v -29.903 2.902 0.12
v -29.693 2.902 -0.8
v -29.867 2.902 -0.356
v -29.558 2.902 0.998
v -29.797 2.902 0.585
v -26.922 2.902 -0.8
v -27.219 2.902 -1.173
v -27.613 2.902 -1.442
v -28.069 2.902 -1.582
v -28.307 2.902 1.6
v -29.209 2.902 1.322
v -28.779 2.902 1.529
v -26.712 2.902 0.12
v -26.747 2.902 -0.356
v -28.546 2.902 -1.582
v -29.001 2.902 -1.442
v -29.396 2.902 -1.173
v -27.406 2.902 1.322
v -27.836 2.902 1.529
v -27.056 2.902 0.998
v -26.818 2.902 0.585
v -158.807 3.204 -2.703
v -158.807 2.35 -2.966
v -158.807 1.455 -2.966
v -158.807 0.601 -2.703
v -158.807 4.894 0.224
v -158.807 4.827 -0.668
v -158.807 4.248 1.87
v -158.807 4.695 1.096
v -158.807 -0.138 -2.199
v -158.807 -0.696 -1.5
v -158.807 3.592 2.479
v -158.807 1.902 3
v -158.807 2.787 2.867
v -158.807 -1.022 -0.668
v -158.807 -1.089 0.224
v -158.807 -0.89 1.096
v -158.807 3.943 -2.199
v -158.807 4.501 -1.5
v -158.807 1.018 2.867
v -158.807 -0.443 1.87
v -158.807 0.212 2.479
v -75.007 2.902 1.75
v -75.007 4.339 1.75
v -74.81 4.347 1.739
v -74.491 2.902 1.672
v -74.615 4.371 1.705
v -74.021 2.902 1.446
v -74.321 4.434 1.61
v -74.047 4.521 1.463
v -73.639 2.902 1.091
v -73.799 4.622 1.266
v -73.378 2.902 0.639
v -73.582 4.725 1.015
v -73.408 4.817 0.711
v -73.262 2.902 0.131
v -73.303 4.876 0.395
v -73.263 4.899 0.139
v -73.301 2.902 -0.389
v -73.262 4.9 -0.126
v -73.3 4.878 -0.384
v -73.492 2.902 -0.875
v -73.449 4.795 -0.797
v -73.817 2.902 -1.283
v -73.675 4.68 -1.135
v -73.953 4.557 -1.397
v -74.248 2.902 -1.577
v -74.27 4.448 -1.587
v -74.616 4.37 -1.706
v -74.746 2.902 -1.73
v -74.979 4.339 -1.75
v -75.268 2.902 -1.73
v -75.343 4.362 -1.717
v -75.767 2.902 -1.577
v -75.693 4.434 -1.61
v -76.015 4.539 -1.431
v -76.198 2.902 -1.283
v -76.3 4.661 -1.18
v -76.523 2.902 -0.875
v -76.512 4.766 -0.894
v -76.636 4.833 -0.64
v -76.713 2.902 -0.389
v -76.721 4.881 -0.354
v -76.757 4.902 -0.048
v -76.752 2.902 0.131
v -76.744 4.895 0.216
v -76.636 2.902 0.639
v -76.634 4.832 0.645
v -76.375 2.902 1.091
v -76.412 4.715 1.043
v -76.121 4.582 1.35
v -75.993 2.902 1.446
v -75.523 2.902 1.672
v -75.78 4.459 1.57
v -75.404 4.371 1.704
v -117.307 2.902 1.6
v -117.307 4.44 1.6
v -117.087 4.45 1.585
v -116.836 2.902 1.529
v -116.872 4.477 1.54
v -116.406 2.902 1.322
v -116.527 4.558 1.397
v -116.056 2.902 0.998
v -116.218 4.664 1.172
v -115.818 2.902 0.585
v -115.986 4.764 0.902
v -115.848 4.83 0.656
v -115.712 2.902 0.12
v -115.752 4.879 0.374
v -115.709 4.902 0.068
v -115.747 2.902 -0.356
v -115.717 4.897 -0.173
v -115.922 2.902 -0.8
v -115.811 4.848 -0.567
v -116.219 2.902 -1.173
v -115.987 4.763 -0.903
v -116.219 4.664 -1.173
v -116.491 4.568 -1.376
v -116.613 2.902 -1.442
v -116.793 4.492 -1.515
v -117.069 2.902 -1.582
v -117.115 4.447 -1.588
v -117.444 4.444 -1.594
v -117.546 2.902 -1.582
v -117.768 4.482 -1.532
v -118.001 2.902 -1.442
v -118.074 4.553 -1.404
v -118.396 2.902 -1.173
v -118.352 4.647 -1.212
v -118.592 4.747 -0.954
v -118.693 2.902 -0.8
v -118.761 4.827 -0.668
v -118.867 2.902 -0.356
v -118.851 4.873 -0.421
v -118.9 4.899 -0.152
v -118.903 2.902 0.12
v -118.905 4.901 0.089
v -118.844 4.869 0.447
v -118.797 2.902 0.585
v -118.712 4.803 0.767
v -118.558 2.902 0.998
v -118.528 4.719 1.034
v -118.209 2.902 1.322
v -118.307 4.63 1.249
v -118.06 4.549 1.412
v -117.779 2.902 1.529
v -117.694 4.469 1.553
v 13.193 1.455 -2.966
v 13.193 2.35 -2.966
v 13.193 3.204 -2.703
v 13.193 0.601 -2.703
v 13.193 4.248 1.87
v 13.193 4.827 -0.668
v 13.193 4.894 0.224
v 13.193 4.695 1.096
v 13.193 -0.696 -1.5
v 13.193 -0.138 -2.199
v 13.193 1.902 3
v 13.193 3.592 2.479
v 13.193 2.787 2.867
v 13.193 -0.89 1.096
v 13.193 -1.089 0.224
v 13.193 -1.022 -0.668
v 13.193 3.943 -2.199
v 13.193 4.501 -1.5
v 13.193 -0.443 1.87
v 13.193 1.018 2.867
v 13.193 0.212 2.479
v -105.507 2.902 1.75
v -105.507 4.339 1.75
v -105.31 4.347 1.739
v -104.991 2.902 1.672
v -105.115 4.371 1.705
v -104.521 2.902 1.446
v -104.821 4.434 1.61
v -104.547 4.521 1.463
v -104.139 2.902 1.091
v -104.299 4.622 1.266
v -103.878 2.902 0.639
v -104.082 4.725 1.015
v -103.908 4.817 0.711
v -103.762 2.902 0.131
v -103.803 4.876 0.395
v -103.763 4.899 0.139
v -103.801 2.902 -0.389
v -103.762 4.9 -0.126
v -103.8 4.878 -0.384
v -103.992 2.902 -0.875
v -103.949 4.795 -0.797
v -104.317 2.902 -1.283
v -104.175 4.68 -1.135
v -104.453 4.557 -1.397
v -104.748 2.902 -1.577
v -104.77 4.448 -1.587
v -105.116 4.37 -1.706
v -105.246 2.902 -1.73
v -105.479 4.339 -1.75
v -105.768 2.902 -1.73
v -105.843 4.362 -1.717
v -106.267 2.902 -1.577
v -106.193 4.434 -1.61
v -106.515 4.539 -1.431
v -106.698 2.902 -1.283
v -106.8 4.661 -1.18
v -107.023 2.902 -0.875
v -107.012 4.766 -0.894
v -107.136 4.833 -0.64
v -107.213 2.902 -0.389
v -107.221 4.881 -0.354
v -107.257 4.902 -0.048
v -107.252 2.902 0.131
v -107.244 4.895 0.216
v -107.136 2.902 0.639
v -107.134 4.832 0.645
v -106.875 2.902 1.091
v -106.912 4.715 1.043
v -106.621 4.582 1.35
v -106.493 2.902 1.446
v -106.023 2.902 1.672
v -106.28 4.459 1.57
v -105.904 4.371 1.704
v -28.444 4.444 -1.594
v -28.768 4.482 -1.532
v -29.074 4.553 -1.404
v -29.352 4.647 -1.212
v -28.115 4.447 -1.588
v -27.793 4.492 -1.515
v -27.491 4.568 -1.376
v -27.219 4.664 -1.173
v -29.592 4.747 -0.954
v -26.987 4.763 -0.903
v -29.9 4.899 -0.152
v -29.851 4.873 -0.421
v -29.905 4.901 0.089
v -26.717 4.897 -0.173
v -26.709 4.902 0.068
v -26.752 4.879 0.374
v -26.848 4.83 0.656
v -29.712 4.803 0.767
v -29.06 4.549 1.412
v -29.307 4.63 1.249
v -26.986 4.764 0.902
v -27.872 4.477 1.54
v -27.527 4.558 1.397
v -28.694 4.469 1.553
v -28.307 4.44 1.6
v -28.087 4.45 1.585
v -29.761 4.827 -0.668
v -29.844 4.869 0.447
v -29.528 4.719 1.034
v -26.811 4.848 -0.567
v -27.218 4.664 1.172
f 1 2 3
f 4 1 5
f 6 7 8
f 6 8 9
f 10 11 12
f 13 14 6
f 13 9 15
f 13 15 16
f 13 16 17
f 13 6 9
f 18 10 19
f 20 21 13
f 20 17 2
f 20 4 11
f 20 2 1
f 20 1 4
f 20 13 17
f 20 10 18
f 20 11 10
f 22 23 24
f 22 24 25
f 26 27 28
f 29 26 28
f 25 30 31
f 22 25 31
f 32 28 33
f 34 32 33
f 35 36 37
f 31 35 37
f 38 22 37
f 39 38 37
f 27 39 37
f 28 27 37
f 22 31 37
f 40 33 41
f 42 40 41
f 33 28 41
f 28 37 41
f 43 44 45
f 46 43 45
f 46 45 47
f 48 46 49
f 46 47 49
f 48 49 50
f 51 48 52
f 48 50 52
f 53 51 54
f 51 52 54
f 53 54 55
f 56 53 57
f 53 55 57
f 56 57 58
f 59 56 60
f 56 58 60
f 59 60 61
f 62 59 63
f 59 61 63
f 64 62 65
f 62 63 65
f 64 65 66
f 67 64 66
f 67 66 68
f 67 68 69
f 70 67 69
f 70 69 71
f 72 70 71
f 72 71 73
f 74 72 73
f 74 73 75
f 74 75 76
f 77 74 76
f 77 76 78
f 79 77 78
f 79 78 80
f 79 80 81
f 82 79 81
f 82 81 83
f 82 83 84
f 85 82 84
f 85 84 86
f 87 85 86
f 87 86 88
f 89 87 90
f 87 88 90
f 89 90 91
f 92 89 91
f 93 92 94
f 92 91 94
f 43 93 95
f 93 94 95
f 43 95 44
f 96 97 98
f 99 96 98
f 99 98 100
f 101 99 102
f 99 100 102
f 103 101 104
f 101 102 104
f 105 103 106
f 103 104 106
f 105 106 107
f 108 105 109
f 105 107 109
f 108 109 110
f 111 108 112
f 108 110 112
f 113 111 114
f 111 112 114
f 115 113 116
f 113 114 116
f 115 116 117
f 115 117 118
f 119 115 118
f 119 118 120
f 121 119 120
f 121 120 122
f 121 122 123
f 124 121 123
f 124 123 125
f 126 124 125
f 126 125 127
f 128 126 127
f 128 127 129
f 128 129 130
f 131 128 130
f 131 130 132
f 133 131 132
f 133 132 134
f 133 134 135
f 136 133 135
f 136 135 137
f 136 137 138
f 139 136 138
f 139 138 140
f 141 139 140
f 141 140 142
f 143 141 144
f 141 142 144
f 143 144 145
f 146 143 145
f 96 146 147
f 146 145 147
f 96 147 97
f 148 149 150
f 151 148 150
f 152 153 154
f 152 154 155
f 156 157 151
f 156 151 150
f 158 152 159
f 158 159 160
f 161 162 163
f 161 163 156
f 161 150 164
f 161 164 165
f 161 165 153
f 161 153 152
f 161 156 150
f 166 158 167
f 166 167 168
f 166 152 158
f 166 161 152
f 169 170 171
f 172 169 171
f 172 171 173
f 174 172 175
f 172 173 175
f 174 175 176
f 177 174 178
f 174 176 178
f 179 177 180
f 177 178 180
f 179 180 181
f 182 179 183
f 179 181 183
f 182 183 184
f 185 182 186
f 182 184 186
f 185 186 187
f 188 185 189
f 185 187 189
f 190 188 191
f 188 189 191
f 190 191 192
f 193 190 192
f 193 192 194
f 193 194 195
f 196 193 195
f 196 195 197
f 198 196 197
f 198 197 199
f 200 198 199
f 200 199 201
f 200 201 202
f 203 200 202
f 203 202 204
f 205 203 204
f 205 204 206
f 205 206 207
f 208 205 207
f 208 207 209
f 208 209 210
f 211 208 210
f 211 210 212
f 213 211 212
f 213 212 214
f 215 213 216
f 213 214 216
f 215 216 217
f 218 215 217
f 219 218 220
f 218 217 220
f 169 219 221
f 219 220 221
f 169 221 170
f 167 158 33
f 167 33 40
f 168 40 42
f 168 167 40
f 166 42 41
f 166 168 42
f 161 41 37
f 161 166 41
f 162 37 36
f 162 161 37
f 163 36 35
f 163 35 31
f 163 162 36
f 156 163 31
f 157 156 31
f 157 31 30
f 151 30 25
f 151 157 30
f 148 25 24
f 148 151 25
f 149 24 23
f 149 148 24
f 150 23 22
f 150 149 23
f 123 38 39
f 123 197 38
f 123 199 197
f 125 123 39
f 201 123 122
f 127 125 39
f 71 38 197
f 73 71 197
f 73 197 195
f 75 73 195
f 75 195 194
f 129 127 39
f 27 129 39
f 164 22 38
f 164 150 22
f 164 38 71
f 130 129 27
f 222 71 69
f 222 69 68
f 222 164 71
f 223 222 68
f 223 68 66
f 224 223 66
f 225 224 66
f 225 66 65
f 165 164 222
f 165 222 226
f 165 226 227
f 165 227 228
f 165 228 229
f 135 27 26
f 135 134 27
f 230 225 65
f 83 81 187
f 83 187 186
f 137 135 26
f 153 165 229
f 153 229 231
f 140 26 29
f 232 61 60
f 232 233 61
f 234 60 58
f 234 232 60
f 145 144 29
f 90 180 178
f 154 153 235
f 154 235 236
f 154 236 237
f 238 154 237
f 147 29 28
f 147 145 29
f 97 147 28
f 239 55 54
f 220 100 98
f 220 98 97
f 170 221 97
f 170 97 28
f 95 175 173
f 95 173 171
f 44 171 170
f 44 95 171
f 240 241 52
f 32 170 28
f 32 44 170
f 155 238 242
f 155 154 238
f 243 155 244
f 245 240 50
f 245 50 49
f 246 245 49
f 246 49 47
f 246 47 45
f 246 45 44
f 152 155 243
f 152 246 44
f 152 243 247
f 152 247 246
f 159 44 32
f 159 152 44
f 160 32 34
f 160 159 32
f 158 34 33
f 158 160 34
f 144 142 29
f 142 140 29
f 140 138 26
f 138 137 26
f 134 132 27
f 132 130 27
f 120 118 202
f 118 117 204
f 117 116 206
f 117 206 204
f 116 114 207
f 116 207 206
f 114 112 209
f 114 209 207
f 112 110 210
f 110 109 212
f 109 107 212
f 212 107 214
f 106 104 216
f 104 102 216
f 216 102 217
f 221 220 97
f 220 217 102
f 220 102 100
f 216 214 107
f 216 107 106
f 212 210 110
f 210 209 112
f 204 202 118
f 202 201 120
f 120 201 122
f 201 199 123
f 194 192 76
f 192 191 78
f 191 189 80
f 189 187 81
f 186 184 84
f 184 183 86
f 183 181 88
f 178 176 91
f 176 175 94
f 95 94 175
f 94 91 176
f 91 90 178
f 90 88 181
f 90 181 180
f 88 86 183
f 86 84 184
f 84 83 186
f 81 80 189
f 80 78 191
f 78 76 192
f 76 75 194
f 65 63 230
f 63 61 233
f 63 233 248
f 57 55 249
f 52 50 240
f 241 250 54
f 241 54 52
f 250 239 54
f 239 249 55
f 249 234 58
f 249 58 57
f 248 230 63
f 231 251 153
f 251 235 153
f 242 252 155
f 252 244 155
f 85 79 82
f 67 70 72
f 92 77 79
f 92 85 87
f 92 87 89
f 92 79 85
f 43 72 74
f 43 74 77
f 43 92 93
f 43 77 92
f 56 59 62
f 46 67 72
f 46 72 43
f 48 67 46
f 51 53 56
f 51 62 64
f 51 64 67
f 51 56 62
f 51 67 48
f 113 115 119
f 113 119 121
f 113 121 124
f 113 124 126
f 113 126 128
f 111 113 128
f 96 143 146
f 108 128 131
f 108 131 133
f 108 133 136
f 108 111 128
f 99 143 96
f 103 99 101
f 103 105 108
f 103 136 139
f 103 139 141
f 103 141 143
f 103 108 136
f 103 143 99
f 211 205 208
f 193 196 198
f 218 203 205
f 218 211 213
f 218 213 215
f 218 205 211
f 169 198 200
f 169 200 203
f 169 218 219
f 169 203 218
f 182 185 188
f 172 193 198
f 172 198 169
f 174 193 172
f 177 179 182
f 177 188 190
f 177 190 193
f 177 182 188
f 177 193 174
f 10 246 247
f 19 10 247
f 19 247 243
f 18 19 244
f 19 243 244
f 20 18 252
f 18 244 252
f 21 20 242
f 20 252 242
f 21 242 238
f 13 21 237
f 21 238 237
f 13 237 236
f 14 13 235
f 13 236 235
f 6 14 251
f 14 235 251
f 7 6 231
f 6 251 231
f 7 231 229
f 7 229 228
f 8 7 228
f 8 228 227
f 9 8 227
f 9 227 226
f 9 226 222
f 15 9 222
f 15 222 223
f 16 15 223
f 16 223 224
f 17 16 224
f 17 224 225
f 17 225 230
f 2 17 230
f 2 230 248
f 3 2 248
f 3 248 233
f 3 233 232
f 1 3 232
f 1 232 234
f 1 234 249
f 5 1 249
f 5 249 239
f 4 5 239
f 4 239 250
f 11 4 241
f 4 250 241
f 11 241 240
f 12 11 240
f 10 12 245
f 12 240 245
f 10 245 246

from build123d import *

# Parameters (mm, degrees)
SKETCH1_W          = 172
SKETCH1_H          = 3
SKETCH3_R          = 1.75
SKETCH3_R_2        = 1.6
CUT_EXTRUDE1_DEPTH = 2


with BuildPart() as part:
    # Sketch1 → Revolve1 (revolve)
    with BuildSketch(Plane.XY, mode=Mode.PRIVATE) as revolve1_sk:
        with Locations((-72.807280427, 0.402439024)):
            Rectangle(SKETCH1_W, SKETCH1_H)
    revolve(revolve1_sk.sketch.rotate(Axis((-158.807280427, 1.902439024, 0), (1, 0, 0)), 270), axis=Axis((-158.807280427, 1.902439024, 0), (1, 0, 0)))

    # Sketch3 → Cut-Extrude1 (cut)
    with BuildSketch(Plane(origin=(-158.807280427, 4.902439024, 0), x_dir=(1, 0, 0), z_dir=(0, 1, 0))):
        with Locations(Location((83.8, 0, 0), (0, 0, 270))):
            Circle(SKETCH3_R)
        with Locations(Location((41.5, 0, 0), (0, 0, 270))):
            Circle(SKETCH3_R_2)
        with Locations(Location((53.3, 0, 0), (0, 0, 270))):
            Circle(SKETCH3_R)
        with Locations(Location((130.5, 0, 0), (0, 0, 270))):
            Circle(SKETCH3_R_2)
    extrude(amount=-CUT_EXTRUDE1_DEPTH, mode=Mode.SUBTRACT)


solid = part.part
